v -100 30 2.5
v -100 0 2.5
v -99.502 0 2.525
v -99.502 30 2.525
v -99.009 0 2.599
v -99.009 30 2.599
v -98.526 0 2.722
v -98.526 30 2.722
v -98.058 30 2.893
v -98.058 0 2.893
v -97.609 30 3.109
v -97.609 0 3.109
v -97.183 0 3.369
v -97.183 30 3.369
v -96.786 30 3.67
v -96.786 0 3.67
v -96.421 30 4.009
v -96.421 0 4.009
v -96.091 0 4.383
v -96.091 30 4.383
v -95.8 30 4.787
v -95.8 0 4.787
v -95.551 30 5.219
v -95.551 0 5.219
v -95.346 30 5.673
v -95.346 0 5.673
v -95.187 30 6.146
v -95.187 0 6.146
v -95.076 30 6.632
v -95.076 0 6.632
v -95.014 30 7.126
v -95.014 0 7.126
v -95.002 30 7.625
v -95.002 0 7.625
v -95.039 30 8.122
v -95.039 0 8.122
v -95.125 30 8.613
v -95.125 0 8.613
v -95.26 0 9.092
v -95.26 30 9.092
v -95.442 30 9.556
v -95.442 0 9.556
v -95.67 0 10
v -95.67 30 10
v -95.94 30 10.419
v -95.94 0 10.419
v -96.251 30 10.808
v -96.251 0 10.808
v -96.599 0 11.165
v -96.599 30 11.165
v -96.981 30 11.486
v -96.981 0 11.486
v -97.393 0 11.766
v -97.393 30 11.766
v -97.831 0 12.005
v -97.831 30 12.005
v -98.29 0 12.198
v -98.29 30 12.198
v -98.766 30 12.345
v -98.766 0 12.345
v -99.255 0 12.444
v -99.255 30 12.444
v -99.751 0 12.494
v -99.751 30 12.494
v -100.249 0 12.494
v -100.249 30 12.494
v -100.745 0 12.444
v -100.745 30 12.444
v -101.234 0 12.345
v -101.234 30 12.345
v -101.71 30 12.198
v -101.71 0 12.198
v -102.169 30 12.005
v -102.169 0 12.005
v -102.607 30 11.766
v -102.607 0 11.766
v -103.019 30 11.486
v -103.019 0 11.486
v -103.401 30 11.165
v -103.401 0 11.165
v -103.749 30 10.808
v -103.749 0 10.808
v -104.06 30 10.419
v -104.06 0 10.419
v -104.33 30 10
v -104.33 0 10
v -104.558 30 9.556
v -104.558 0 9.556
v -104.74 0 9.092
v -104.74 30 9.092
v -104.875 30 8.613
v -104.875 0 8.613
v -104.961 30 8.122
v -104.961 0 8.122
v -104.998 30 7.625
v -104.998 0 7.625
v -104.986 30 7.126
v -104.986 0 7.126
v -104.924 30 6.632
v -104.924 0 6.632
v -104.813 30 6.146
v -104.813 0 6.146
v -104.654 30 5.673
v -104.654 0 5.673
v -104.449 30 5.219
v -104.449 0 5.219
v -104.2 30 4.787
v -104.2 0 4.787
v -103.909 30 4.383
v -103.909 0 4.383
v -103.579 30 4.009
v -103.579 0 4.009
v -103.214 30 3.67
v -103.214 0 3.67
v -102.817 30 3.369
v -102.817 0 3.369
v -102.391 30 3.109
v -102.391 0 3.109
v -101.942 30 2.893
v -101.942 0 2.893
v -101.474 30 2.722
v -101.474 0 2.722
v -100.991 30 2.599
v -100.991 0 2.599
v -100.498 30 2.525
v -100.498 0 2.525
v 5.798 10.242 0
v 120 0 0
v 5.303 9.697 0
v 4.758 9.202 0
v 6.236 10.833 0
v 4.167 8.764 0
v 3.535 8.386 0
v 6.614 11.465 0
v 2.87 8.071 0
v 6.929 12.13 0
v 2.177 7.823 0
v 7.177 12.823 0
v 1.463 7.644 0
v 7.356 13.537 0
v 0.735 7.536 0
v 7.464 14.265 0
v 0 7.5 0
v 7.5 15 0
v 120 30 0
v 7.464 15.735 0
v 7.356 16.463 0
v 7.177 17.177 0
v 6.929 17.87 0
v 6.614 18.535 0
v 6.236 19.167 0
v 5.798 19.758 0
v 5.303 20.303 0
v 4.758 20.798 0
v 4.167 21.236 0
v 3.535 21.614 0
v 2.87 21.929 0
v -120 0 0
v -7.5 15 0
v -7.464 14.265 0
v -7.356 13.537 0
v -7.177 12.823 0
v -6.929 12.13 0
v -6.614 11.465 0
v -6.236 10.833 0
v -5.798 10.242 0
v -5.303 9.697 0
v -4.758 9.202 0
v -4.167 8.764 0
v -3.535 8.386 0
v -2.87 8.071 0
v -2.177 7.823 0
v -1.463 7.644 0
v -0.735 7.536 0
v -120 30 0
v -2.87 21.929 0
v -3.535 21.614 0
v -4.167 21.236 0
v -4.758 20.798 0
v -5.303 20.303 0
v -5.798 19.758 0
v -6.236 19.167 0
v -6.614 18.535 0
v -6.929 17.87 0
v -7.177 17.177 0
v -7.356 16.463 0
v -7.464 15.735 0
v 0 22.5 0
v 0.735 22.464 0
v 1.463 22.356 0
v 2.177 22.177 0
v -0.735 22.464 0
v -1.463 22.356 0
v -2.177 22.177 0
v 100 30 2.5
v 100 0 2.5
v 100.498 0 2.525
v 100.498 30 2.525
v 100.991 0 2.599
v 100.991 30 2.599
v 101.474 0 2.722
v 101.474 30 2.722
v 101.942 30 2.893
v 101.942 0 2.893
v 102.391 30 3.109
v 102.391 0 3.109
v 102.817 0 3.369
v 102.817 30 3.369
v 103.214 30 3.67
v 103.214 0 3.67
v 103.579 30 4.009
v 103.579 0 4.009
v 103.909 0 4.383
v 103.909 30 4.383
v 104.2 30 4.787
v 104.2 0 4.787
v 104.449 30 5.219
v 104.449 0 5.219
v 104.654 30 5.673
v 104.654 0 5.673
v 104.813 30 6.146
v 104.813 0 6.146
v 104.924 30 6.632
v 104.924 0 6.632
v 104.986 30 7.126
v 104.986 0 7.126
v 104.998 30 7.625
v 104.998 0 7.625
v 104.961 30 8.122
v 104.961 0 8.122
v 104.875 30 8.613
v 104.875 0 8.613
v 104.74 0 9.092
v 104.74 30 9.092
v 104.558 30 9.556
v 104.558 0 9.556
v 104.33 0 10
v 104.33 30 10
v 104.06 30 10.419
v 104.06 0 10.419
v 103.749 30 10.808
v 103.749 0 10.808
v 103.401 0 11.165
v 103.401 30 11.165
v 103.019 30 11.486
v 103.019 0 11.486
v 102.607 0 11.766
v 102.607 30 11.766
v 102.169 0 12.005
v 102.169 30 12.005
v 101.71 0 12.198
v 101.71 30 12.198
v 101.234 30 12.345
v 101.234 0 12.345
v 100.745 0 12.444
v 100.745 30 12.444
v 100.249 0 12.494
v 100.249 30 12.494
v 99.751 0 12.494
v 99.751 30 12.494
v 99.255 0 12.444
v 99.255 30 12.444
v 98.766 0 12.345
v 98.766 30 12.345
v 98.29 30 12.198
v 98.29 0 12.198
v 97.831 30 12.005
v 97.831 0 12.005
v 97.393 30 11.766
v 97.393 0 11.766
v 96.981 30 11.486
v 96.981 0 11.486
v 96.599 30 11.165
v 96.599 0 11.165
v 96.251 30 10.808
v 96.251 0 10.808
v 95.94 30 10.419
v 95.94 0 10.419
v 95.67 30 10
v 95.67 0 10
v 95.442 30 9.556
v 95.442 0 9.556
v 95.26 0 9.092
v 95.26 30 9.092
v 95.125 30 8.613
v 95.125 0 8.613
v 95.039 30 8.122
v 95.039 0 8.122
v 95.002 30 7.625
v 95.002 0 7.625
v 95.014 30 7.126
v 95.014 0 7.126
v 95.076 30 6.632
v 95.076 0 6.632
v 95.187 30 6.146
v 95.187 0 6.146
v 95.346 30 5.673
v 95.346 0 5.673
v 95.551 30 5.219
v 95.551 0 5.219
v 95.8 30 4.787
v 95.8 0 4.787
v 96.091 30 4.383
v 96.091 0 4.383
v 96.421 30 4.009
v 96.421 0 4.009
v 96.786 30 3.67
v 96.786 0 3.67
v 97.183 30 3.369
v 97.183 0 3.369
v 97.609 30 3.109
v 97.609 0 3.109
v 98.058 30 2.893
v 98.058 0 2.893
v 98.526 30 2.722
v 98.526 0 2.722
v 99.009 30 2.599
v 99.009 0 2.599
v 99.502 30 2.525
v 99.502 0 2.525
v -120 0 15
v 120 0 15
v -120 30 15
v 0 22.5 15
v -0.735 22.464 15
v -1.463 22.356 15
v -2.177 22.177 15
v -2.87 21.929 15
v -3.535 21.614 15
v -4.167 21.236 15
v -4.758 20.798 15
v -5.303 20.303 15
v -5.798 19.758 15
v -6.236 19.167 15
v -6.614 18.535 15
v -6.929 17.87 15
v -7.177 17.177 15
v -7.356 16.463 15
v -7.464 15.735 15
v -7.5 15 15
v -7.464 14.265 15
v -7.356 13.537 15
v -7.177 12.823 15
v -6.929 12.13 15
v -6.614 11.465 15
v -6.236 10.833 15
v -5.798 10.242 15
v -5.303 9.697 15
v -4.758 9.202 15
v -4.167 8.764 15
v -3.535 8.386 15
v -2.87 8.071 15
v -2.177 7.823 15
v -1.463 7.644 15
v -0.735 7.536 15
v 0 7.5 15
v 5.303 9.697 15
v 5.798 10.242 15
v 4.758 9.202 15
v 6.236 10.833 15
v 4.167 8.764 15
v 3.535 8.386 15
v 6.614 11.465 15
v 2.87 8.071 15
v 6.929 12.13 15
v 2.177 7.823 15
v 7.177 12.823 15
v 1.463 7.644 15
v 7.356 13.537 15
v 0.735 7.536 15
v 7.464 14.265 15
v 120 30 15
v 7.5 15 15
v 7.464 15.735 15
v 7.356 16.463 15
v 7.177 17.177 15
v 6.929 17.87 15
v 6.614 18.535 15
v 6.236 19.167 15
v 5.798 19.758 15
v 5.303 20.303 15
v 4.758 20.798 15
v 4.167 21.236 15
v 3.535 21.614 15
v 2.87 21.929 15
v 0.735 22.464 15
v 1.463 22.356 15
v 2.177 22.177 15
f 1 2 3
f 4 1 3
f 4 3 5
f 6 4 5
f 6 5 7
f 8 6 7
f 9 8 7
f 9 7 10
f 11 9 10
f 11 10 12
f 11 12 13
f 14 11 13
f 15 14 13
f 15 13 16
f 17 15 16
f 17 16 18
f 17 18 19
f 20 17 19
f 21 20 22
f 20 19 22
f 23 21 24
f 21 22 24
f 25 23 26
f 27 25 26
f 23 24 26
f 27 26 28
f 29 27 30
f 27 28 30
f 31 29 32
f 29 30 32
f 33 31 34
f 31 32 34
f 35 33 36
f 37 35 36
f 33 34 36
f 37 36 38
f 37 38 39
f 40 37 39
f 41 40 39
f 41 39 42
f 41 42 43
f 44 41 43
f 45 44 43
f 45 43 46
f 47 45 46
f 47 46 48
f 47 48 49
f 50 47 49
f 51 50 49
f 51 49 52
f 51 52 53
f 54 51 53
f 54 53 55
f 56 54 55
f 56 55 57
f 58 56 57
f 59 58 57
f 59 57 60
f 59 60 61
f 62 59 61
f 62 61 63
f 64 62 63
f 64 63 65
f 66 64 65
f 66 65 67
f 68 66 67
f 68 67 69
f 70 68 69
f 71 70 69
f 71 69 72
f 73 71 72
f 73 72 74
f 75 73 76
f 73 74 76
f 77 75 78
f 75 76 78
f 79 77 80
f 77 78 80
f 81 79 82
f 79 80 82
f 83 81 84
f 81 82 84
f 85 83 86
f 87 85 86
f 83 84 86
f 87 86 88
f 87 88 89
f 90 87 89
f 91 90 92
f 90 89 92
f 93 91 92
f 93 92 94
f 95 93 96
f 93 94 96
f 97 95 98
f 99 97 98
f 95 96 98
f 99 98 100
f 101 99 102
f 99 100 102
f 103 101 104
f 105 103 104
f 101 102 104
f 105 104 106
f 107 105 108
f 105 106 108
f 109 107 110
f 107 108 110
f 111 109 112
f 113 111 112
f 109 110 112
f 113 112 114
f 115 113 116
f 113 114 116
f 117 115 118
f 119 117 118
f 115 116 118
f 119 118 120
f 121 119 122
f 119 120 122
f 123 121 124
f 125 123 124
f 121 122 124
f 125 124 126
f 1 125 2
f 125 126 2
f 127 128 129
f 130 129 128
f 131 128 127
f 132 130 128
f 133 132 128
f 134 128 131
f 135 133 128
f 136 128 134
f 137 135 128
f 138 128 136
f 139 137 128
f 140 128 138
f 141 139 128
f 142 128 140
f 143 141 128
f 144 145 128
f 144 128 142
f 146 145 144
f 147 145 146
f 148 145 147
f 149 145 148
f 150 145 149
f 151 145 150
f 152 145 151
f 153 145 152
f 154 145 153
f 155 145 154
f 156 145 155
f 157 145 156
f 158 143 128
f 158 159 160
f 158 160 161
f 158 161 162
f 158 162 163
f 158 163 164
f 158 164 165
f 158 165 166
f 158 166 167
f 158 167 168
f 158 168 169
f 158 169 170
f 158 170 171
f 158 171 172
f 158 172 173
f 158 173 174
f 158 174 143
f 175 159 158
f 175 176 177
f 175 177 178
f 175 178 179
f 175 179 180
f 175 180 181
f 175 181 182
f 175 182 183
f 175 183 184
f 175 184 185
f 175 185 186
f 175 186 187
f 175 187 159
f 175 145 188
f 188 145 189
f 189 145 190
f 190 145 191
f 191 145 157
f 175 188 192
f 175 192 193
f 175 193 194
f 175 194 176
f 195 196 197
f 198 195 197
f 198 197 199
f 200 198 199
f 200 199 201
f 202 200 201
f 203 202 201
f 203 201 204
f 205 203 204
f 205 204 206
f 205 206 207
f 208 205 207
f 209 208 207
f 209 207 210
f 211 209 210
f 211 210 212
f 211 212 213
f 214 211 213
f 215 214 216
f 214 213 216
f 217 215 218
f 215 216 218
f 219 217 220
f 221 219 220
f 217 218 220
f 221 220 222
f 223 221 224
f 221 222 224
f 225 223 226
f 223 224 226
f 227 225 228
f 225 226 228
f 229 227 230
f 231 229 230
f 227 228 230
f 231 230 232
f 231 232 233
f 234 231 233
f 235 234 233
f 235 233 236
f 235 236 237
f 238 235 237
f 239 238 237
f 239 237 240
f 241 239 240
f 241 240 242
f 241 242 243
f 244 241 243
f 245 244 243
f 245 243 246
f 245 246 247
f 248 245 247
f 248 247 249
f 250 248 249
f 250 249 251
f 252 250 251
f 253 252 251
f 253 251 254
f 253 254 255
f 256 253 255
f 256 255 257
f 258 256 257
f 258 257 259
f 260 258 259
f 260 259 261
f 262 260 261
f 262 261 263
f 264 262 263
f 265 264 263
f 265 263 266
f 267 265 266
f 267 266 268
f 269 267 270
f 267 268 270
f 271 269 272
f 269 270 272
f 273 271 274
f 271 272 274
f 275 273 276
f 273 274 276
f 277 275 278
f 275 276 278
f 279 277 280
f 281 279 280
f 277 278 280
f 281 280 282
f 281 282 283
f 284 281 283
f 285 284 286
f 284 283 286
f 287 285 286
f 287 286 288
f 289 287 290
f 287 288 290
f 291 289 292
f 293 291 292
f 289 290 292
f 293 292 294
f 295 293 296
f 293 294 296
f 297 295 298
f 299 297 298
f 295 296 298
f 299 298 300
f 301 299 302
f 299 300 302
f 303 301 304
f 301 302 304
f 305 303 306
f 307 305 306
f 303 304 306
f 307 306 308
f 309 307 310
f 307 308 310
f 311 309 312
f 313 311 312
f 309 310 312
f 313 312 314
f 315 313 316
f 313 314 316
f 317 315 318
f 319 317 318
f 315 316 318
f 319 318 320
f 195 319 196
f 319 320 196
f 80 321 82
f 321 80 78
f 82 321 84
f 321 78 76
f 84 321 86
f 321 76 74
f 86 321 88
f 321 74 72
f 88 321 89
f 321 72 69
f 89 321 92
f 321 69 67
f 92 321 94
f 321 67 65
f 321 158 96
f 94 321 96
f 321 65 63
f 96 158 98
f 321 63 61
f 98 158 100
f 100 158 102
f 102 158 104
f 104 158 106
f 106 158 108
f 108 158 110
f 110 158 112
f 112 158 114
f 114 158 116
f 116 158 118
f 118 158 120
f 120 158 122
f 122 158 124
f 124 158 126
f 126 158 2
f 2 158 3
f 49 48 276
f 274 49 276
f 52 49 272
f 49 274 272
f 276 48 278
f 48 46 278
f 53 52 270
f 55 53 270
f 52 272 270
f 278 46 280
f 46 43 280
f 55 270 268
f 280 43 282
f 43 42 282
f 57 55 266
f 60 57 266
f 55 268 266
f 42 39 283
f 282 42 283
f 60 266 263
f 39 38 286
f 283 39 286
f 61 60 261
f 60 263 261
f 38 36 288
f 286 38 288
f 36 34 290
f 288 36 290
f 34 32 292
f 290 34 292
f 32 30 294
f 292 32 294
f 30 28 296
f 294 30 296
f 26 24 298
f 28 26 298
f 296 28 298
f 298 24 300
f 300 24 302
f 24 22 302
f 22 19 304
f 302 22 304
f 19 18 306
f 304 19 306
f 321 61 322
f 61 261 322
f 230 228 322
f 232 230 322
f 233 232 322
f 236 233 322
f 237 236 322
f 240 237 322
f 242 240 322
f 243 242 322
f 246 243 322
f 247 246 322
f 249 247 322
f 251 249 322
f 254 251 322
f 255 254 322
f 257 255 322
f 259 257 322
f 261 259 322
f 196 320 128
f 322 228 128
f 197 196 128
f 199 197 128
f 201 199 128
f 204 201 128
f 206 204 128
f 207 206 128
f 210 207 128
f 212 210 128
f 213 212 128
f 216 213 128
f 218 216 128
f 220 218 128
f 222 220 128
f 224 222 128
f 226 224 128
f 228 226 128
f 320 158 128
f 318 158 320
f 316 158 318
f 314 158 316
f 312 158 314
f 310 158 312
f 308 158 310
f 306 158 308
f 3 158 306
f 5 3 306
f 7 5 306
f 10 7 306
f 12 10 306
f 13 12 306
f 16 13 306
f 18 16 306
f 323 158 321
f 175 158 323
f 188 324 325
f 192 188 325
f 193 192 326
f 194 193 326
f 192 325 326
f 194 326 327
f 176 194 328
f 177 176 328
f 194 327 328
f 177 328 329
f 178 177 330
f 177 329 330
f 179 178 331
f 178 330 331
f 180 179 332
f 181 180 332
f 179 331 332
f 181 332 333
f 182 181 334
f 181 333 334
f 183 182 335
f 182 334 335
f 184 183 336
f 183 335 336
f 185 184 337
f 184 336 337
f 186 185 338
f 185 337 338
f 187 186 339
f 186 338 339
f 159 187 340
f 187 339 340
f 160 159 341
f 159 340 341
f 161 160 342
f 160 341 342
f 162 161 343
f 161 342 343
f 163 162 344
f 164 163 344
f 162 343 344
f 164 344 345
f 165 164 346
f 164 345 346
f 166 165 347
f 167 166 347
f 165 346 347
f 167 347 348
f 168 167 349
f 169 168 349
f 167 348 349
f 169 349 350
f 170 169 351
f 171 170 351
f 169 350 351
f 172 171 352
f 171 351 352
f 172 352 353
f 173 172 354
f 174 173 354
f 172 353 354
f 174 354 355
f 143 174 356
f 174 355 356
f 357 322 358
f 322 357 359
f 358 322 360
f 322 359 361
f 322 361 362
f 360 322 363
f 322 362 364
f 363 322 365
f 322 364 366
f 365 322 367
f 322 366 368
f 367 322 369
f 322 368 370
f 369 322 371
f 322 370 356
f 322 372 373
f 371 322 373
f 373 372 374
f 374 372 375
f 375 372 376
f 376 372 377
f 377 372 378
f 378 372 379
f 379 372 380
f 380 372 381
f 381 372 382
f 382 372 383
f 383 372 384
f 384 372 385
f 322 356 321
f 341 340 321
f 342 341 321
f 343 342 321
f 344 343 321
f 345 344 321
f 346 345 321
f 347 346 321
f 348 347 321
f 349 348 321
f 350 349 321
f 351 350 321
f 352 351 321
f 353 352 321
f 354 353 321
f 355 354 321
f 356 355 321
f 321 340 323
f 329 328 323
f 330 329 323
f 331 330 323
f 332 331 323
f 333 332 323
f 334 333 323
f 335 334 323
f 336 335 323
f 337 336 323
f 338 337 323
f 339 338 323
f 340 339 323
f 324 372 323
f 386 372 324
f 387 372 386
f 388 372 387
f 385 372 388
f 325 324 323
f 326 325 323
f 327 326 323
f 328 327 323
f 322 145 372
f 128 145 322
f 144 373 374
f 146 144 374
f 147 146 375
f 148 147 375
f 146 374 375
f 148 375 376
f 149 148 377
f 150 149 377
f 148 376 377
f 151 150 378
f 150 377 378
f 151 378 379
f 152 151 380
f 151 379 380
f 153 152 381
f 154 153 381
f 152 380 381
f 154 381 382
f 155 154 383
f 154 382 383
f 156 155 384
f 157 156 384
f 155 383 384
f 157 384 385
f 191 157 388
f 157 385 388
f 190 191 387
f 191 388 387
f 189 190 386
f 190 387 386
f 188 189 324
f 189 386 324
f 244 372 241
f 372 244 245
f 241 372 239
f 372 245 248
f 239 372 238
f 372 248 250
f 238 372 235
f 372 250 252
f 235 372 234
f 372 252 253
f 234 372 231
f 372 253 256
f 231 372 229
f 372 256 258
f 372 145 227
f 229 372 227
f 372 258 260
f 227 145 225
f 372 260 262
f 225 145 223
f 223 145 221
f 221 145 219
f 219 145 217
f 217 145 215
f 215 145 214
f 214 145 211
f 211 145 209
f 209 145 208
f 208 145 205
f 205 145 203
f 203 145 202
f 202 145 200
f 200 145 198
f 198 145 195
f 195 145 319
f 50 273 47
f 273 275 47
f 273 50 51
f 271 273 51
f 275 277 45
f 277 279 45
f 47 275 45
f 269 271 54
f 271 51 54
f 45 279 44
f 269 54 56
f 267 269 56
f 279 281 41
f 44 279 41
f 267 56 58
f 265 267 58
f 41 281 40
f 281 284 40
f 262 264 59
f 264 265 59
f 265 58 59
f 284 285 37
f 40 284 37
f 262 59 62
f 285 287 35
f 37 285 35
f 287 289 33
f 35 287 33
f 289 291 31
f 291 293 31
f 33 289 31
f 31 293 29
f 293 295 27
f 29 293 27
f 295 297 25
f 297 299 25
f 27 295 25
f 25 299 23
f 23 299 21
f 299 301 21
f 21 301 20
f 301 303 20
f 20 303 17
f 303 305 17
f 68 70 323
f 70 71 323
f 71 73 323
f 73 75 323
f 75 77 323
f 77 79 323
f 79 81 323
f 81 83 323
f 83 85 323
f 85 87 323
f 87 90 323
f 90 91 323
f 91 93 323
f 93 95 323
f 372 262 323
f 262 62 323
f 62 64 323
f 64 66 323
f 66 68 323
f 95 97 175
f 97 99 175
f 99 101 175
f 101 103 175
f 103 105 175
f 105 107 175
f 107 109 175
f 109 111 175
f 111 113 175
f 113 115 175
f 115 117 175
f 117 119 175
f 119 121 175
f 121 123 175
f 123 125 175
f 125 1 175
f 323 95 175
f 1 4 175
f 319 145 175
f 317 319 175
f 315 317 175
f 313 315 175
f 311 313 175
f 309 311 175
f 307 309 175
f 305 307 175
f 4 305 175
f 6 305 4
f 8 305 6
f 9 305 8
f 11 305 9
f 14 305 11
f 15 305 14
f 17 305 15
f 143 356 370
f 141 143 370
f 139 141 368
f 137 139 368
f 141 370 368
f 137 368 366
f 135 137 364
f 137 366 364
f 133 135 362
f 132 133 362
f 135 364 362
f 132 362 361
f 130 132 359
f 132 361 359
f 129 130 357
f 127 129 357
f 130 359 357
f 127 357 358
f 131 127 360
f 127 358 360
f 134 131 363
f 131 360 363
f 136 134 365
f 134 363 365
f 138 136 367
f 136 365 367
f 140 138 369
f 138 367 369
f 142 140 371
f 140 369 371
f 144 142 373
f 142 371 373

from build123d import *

# Parameters (mm, degrees)
RESSALTO_EXTRUS_O1_DEPTH = 15
CORTE_EXTRUS_O1_DEPTH    = 15
ESBO_O10_R               = 5
CORTE_EXTRUS_O9_DEPTH    = 79


with BuildPart() as part:
    # Esboço1 → Ressalto-extrusão1 (new body)
    with BuildSketch(Plane.XY):
        Polygon((100, 0), (-100, 0), (-120, 0), (-120, 30), (-100, 30), (100, 30), (120, 30), (120, 0), align=None)
    extrude(amount=RESSALTO_EXTRUS_O1_DEPTH)

    # Esboço2 → Corte-extrusão1 (cut)
    with BuildSketch(Plane.XY.offset(15)):
        with BuildLine():
            ThreePointArc((7.5, 15), (5.303300859, 20.303300859), (0, 22.5))
            Line((0, 22.5), (0, 7.5))
            ThreePointArc((0, 7.5), (5.303300859, 9.696699141), (7.5, 15))
        make_face()
        with BuildLine():
            Line((0, 7.5), (0, 22.5))
            ThreePointArc((0, 22.5), (-7.5, 15), (0, 7.5))
        make_face()
    extrude(amount=-CORTE_EXTRUS_O1_DEPTH, mode=Mode.SUBTRACT)

    # Esboço10 → Corte-extrusão9 (cut)
    with BuildSketch(Plane(origin=(0, 0, 0), x_dir=(-1, 0, 0), z_dir=(0, -1, 0))):
        with Locations(Location((100, -7.5, 0), (0, 0, 90))):
            Circle(ESBO_O10_R)
        with Locations(Location((-100, -7.5, 0), (0, 0, 90))):
            Circle(ESBO_O10_R)
    extrude(amount=-CORTE_EXTRUS_O9_DEPTH, mode=Mode.SUBTRACT)


solid = part.part
